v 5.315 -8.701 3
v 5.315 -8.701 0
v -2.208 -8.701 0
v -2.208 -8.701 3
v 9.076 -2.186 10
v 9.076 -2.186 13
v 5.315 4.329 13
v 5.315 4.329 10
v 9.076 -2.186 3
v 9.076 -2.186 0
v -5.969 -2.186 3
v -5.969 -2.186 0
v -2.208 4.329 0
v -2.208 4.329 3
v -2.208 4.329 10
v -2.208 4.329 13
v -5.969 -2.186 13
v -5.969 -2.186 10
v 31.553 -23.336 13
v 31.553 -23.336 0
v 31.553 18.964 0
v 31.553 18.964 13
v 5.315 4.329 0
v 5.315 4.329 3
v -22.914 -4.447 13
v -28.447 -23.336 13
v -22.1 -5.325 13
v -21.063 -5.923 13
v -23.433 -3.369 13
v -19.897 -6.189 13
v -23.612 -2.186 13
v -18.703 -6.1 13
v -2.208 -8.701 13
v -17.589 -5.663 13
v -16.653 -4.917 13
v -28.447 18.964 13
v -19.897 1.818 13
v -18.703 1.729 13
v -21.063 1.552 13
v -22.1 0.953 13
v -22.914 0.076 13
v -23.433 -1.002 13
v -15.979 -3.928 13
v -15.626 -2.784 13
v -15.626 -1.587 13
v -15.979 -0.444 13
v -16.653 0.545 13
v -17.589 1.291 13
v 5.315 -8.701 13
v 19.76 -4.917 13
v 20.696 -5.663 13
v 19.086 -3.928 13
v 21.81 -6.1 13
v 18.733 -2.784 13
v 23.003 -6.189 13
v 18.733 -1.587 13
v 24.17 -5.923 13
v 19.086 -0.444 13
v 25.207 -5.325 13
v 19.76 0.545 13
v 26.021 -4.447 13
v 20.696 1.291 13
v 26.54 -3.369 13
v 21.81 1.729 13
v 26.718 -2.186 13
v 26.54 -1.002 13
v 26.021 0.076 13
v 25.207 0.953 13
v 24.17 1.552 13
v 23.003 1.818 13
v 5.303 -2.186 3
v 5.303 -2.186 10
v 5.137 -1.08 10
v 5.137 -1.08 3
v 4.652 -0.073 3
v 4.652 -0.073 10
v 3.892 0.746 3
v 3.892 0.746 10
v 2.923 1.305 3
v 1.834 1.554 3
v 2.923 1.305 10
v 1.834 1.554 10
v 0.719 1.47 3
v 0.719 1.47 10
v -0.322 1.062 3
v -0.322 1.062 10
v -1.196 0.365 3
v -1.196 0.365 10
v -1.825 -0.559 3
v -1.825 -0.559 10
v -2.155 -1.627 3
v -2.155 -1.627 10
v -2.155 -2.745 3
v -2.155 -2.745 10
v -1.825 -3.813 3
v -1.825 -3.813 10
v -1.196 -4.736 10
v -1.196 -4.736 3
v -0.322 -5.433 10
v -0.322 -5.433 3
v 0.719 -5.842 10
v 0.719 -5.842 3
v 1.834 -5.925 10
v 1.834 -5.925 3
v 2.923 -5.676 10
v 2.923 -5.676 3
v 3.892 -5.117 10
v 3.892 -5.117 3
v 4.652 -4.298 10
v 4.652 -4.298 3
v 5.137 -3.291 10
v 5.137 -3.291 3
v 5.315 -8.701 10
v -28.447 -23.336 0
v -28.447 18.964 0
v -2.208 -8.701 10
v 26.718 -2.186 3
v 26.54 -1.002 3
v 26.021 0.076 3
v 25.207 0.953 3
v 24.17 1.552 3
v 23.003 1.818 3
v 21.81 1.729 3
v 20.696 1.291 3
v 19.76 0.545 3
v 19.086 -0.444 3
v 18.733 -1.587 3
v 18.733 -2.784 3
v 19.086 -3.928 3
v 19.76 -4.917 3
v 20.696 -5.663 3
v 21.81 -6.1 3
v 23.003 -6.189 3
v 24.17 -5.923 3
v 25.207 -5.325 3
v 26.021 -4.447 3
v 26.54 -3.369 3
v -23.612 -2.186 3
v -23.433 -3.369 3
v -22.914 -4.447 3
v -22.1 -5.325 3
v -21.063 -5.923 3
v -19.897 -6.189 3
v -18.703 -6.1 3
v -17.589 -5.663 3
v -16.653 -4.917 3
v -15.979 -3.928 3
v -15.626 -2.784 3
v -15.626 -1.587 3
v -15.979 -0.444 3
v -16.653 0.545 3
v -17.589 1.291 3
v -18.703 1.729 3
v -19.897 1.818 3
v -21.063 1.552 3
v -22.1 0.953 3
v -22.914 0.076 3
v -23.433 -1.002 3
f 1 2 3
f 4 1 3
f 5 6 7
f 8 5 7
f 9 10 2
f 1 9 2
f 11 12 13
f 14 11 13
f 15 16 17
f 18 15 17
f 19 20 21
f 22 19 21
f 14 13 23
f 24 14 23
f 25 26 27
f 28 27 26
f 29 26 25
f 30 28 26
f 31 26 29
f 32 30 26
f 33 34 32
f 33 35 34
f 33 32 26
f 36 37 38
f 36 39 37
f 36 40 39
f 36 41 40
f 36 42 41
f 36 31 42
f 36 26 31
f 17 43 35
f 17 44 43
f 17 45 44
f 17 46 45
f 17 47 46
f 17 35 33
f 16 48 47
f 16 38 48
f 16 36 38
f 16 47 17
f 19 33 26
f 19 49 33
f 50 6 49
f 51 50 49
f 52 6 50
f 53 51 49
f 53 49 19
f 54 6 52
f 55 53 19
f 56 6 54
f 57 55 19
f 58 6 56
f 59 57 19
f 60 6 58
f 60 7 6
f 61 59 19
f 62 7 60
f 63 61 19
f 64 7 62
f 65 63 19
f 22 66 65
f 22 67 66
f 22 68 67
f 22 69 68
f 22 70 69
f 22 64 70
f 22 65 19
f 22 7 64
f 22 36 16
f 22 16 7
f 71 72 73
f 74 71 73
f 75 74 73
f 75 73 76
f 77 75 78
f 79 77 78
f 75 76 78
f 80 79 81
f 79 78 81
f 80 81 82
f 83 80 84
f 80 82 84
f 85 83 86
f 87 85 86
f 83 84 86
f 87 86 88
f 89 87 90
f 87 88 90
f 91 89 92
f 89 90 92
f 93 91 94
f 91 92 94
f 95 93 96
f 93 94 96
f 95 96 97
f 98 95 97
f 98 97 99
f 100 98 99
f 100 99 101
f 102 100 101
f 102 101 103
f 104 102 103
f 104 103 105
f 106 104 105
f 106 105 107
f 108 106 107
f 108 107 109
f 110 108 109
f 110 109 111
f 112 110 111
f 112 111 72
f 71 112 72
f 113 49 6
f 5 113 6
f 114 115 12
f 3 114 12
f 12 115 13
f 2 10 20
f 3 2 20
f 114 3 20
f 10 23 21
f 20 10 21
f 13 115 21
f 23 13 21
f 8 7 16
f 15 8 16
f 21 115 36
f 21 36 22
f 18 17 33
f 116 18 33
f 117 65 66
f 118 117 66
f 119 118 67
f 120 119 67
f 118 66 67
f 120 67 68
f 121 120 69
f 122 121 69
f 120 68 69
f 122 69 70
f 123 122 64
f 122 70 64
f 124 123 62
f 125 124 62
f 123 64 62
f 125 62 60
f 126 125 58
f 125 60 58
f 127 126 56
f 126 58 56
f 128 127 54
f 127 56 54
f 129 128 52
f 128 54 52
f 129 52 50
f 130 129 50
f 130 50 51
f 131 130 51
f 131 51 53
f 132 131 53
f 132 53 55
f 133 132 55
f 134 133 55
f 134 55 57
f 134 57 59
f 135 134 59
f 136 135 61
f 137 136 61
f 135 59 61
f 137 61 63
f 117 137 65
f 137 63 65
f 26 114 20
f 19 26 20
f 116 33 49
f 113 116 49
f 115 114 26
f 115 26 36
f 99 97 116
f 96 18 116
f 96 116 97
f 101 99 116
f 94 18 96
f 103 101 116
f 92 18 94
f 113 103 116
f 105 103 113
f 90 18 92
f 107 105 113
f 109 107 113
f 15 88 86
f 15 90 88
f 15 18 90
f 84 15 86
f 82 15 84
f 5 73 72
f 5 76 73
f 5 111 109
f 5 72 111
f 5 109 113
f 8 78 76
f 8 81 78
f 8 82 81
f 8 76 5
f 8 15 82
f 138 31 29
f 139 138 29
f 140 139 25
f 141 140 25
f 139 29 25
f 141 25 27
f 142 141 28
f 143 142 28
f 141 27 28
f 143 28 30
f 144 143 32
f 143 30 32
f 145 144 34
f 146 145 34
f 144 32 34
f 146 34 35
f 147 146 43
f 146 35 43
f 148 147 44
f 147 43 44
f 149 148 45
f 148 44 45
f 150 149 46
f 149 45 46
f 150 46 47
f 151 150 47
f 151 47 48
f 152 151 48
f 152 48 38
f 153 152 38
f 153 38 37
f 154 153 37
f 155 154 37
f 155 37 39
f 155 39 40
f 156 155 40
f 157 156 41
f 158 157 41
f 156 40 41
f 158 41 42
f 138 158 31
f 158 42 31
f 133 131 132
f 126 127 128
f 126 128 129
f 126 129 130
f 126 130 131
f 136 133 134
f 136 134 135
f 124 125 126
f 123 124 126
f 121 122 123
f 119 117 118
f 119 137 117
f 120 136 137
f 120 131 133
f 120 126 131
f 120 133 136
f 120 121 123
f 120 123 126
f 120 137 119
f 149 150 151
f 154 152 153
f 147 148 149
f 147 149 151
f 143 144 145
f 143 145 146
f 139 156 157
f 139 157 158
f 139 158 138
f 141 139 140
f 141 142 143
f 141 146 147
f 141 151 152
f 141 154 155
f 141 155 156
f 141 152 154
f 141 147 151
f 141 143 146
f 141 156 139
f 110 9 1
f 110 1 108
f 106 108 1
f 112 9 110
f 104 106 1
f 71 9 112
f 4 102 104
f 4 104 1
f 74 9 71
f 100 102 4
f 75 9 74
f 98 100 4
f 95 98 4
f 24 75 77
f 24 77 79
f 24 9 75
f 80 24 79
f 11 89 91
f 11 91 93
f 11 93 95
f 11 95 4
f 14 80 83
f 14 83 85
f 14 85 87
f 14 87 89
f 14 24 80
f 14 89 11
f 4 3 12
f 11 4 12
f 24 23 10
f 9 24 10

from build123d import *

# Parameters (mm, degrees)
SKETCH2_W           = 60
SKETCH2_H           = 42.3
BOSS_EXTRUDE1_DEPTH = 13
SKETCH3_R           = 4.015
CUT_EXTRUDE1_DEPTH  = 10
CUT_EXTRUDE2_DEPTH  = 3
SKETCH5_R           = 3.75
CUT_EXTRUDE3_DEPTH  = 41.498999822
CUT_EXTRUDE4_DEPTH  = 3


with BuildPart() as part:
    # Sketch2 → Boss-Extrude1 (new body)
    with BuildSketch(Plane.XY):
        with Locations((1.553418124, -2.185612083)):
            Rectangle(SKETCH2_W, SKETCH2_H)
    extrude(amount=BOSS_EXTRUDE1_DEPTH)

    # Sketch3 → Cut-Extrude1 (cut)
    with BuildSketch(Plane.XY.offset(13)):
        with Locations((22.703418124, -2.185612083)):
            Circle(SKETCH3_R)
        with Locations(Location((-19.596581876, -2.185612083, 0), (0, 0, 180))):
            Circle(SKETCH3_R)
    extrude(amount=-CUT_EXTRUDE1_DEPTH, mode=Mode.SUBTRACT)

    # Sketch4 → Cut-Extrude2 (cut)
    with BuildSketch(Plane.XY.offset(13)):
        Polygon((9.076292132, -2.185612083), (5.314855128, 4.329387917), (-2.20801888, 4.329387917), (-5.969455884, -2.185612083), (-2.20801888, -8.700612083), (5.314855128, -8.700612083), align=None)
    extrude(amount=-CUT_EXTRUDE2_DEPTH, mode=Mode.SUBTRACT)

    # Sketch5 → Cut-Extrude3 (cut, through all)
    with BuildSketch(Plane.XY.offset(10)):
        with Locations((1.553418124, -2.185612083)):
            Circle(SKETCH5_R)
    extrude(amount=-CUT_EXTRUDE3_DEPTH, mode=Mode.SUBTRACT)

    # Sketch6 → Cut-Extrude4 (cut)
    with BuildSketch(Plane(origin=(0, 0, 0), x_dir=(-1, 0, 0), z_dir=(0, 0, -1))):
        Polygon((5.969455884, -2.185612083), (2.20801888, 4.329387917), (-5.314855128, 4.329387917), (-9.076292132, -2.185612083), (-5.314855128, -8.700612083), (2.20801888, -8.700612083), align=None)
    extrude(amount=-CUT_EXTRUDE4_DEPTH, mode=Mode.SUBTRACT)


solid = part.part
